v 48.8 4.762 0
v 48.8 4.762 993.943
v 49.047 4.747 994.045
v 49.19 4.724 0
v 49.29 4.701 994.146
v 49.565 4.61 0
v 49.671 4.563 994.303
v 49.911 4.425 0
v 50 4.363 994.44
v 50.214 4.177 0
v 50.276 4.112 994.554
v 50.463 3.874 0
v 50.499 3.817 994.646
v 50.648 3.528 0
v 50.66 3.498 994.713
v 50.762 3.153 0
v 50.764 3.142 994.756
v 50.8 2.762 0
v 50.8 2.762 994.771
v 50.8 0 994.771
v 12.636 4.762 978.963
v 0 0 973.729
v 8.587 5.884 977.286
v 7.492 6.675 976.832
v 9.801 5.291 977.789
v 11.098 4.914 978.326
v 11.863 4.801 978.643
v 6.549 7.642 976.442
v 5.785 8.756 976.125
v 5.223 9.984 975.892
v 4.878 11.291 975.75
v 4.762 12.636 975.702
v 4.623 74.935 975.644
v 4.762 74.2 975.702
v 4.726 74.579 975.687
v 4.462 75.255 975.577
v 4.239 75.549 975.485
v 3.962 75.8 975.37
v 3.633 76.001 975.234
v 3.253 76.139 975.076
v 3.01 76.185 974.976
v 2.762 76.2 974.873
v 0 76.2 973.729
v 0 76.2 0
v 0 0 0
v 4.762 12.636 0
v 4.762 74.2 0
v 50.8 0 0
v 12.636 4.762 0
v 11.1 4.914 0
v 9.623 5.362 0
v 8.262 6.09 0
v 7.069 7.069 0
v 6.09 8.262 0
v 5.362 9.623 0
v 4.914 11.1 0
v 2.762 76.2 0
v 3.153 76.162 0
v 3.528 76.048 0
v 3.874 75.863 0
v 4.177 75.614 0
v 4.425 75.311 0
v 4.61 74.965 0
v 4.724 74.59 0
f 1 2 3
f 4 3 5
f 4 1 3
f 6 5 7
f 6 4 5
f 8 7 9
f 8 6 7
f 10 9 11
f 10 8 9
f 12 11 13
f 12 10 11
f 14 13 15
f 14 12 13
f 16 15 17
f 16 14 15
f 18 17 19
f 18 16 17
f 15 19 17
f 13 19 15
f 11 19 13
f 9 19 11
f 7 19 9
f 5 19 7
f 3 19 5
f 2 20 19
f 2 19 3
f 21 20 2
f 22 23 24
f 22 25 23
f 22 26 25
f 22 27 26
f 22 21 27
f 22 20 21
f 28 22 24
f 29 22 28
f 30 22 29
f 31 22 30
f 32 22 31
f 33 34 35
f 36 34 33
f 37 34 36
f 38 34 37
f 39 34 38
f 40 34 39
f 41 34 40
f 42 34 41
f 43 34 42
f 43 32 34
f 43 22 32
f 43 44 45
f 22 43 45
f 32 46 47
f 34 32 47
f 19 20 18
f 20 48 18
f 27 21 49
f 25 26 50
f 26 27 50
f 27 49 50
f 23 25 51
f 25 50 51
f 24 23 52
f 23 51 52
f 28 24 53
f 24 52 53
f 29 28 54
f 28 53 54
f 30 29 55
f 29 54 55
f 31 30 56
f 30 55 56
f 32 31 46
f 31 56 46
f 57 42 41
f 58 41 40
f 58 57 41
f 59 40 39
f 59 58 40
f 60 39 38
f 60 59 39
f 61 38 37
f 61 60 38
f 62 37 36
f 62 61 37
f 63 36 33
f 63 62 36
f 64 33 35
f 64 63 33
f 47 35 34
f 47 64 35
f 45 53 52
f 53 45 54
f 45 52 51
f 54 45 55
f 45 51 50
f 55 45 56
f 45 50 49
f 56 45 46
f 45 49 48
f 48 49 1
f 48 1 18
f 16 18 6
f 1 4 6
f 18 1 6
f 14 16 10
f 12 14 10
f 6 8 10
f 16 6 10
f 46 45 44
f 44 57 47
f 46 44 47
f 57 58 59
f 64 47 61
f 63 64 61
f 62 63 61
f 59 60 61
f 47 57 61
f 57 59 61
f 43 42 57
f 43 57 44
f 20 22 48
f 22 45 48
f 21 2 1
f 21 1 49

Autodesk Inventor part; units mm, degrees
ref_plane "Start plane" through (0, 0, 0) normal (0, 0, 1) x (1, 0, 0)
ref_plane "End plane" through (0, 0, 994.771) normal (0, 0, 1) x (1, 0, 0)
sketch "Sketch" plane through (0, 0, 0) normal (0, 0, 1) x (1, 0, 0)
  line L0 (0, 76.2) -> (0, 0)
  line L1 (0, 0) -> (50.8, 0)
  line L2 (50.8, 0) -> (50.8, 2.7625)
  line L3 (48.8, 4.7625) -> (12.6365, 4.7625)
  line L4 (4.7625, 12.6365) -> (4.7625, 74.2)
  line L5 (2.7625, 76.2) -> (0, 76.2)
  line L6 (-7.0414, 0) -> (21.5385, 0) construction
  line L7 (0, -8.0414) -> (0, 34.5385) construction
  arc A0 (4.7625, 12.6365) -> (12.6365, 4.7625) centre (12.6365, 12.6365) ccw
  arc A1 (50.8, 2.7625) -> (48.8, 4.7625) centre (48.8, 2.7625) ccw
  arc A2 (4.7625, 74.2) -> (2.7625, 76.2) centre (2.7625, 74.2) ccw
  line L8 (0, 93.5453) -> (0, -24.9725) construction
  line L9 (-18.6925, 0) -> (62.8653, 0) construction
  point P0 (50.8, 4.7625)
  point P1 (4.7625, 4.7625)
  point P2 (4.7625, 76.2)
  dimension "d12" = 4.7625
  dimension "d13" = 76.2
  dimension "d14" = 50.8
  dimension "d15" = 0
  dimension "d16" = 4.7625
  dimension "d17" = 0
  dimension "d18" = 7.874
  dimension "d19" = 2
extrude "Body" add sketch "Sketch" along normal up to surface (994.771 mm away) from surface at 0
sketch "Sketch3" plane through (0, 0, 0) normal (0, 0, 1) x (1, 0, 0)
  line L0 (0, 0) -> (10, 0)
ref_plane "Work Plane4" through (0, 0, 0) normal (0, -1, 0) x (1, 0, 0)
sketch "Sketch4" plane through (0, 0, 0) normal (0, -1, 0) x (1, 0, 0)
  line L0 (-2, 0) -> (12, 0)
  line L1 (-2, 994.771) -> (12, 994.771)
  dimension "d23" = 994.771
ref_plane "Work Plane3" through (50.8, 38.1, 994.771) normal (-0.3827, 0, 0.9239) x (0.9239, 0, 0.3827)
split "Split1" plane through (50.8, 38.1, 994.771) removes the side toward (-0.3827, 0, 0.9239)
equation "\"d12\" = G_T"
equation "\"d13\" = G_H"
equation "\"d14\" = G_W"
equation "\"d16\" = G_T"
equation "\"d18\" = G_IR"
equation "\"d4\" = G_L"
equation "\"G_W\" = 50.8"
equation "\"G_H\" = 76.2"
equation "\"G_T\" = 4.7625"
equation "\"G_ER\" = 4.064"
equation "\"G_IR\" = 7.874"
equation "\"G_L\" = d23"
equation "\"ex\" = 0"
equation "\"ey\" = 0"
equation "\"G_OFFSET_START\" = 0"
equation "\"G_OFFSET_END\" = 10.52102"
equation "\"d21\" = G_OFFSET_END + B_L"
equation "\"B_L\" = 984.25"
properties part number "ANSI L 3 x 2 x 3_16 00000001"
